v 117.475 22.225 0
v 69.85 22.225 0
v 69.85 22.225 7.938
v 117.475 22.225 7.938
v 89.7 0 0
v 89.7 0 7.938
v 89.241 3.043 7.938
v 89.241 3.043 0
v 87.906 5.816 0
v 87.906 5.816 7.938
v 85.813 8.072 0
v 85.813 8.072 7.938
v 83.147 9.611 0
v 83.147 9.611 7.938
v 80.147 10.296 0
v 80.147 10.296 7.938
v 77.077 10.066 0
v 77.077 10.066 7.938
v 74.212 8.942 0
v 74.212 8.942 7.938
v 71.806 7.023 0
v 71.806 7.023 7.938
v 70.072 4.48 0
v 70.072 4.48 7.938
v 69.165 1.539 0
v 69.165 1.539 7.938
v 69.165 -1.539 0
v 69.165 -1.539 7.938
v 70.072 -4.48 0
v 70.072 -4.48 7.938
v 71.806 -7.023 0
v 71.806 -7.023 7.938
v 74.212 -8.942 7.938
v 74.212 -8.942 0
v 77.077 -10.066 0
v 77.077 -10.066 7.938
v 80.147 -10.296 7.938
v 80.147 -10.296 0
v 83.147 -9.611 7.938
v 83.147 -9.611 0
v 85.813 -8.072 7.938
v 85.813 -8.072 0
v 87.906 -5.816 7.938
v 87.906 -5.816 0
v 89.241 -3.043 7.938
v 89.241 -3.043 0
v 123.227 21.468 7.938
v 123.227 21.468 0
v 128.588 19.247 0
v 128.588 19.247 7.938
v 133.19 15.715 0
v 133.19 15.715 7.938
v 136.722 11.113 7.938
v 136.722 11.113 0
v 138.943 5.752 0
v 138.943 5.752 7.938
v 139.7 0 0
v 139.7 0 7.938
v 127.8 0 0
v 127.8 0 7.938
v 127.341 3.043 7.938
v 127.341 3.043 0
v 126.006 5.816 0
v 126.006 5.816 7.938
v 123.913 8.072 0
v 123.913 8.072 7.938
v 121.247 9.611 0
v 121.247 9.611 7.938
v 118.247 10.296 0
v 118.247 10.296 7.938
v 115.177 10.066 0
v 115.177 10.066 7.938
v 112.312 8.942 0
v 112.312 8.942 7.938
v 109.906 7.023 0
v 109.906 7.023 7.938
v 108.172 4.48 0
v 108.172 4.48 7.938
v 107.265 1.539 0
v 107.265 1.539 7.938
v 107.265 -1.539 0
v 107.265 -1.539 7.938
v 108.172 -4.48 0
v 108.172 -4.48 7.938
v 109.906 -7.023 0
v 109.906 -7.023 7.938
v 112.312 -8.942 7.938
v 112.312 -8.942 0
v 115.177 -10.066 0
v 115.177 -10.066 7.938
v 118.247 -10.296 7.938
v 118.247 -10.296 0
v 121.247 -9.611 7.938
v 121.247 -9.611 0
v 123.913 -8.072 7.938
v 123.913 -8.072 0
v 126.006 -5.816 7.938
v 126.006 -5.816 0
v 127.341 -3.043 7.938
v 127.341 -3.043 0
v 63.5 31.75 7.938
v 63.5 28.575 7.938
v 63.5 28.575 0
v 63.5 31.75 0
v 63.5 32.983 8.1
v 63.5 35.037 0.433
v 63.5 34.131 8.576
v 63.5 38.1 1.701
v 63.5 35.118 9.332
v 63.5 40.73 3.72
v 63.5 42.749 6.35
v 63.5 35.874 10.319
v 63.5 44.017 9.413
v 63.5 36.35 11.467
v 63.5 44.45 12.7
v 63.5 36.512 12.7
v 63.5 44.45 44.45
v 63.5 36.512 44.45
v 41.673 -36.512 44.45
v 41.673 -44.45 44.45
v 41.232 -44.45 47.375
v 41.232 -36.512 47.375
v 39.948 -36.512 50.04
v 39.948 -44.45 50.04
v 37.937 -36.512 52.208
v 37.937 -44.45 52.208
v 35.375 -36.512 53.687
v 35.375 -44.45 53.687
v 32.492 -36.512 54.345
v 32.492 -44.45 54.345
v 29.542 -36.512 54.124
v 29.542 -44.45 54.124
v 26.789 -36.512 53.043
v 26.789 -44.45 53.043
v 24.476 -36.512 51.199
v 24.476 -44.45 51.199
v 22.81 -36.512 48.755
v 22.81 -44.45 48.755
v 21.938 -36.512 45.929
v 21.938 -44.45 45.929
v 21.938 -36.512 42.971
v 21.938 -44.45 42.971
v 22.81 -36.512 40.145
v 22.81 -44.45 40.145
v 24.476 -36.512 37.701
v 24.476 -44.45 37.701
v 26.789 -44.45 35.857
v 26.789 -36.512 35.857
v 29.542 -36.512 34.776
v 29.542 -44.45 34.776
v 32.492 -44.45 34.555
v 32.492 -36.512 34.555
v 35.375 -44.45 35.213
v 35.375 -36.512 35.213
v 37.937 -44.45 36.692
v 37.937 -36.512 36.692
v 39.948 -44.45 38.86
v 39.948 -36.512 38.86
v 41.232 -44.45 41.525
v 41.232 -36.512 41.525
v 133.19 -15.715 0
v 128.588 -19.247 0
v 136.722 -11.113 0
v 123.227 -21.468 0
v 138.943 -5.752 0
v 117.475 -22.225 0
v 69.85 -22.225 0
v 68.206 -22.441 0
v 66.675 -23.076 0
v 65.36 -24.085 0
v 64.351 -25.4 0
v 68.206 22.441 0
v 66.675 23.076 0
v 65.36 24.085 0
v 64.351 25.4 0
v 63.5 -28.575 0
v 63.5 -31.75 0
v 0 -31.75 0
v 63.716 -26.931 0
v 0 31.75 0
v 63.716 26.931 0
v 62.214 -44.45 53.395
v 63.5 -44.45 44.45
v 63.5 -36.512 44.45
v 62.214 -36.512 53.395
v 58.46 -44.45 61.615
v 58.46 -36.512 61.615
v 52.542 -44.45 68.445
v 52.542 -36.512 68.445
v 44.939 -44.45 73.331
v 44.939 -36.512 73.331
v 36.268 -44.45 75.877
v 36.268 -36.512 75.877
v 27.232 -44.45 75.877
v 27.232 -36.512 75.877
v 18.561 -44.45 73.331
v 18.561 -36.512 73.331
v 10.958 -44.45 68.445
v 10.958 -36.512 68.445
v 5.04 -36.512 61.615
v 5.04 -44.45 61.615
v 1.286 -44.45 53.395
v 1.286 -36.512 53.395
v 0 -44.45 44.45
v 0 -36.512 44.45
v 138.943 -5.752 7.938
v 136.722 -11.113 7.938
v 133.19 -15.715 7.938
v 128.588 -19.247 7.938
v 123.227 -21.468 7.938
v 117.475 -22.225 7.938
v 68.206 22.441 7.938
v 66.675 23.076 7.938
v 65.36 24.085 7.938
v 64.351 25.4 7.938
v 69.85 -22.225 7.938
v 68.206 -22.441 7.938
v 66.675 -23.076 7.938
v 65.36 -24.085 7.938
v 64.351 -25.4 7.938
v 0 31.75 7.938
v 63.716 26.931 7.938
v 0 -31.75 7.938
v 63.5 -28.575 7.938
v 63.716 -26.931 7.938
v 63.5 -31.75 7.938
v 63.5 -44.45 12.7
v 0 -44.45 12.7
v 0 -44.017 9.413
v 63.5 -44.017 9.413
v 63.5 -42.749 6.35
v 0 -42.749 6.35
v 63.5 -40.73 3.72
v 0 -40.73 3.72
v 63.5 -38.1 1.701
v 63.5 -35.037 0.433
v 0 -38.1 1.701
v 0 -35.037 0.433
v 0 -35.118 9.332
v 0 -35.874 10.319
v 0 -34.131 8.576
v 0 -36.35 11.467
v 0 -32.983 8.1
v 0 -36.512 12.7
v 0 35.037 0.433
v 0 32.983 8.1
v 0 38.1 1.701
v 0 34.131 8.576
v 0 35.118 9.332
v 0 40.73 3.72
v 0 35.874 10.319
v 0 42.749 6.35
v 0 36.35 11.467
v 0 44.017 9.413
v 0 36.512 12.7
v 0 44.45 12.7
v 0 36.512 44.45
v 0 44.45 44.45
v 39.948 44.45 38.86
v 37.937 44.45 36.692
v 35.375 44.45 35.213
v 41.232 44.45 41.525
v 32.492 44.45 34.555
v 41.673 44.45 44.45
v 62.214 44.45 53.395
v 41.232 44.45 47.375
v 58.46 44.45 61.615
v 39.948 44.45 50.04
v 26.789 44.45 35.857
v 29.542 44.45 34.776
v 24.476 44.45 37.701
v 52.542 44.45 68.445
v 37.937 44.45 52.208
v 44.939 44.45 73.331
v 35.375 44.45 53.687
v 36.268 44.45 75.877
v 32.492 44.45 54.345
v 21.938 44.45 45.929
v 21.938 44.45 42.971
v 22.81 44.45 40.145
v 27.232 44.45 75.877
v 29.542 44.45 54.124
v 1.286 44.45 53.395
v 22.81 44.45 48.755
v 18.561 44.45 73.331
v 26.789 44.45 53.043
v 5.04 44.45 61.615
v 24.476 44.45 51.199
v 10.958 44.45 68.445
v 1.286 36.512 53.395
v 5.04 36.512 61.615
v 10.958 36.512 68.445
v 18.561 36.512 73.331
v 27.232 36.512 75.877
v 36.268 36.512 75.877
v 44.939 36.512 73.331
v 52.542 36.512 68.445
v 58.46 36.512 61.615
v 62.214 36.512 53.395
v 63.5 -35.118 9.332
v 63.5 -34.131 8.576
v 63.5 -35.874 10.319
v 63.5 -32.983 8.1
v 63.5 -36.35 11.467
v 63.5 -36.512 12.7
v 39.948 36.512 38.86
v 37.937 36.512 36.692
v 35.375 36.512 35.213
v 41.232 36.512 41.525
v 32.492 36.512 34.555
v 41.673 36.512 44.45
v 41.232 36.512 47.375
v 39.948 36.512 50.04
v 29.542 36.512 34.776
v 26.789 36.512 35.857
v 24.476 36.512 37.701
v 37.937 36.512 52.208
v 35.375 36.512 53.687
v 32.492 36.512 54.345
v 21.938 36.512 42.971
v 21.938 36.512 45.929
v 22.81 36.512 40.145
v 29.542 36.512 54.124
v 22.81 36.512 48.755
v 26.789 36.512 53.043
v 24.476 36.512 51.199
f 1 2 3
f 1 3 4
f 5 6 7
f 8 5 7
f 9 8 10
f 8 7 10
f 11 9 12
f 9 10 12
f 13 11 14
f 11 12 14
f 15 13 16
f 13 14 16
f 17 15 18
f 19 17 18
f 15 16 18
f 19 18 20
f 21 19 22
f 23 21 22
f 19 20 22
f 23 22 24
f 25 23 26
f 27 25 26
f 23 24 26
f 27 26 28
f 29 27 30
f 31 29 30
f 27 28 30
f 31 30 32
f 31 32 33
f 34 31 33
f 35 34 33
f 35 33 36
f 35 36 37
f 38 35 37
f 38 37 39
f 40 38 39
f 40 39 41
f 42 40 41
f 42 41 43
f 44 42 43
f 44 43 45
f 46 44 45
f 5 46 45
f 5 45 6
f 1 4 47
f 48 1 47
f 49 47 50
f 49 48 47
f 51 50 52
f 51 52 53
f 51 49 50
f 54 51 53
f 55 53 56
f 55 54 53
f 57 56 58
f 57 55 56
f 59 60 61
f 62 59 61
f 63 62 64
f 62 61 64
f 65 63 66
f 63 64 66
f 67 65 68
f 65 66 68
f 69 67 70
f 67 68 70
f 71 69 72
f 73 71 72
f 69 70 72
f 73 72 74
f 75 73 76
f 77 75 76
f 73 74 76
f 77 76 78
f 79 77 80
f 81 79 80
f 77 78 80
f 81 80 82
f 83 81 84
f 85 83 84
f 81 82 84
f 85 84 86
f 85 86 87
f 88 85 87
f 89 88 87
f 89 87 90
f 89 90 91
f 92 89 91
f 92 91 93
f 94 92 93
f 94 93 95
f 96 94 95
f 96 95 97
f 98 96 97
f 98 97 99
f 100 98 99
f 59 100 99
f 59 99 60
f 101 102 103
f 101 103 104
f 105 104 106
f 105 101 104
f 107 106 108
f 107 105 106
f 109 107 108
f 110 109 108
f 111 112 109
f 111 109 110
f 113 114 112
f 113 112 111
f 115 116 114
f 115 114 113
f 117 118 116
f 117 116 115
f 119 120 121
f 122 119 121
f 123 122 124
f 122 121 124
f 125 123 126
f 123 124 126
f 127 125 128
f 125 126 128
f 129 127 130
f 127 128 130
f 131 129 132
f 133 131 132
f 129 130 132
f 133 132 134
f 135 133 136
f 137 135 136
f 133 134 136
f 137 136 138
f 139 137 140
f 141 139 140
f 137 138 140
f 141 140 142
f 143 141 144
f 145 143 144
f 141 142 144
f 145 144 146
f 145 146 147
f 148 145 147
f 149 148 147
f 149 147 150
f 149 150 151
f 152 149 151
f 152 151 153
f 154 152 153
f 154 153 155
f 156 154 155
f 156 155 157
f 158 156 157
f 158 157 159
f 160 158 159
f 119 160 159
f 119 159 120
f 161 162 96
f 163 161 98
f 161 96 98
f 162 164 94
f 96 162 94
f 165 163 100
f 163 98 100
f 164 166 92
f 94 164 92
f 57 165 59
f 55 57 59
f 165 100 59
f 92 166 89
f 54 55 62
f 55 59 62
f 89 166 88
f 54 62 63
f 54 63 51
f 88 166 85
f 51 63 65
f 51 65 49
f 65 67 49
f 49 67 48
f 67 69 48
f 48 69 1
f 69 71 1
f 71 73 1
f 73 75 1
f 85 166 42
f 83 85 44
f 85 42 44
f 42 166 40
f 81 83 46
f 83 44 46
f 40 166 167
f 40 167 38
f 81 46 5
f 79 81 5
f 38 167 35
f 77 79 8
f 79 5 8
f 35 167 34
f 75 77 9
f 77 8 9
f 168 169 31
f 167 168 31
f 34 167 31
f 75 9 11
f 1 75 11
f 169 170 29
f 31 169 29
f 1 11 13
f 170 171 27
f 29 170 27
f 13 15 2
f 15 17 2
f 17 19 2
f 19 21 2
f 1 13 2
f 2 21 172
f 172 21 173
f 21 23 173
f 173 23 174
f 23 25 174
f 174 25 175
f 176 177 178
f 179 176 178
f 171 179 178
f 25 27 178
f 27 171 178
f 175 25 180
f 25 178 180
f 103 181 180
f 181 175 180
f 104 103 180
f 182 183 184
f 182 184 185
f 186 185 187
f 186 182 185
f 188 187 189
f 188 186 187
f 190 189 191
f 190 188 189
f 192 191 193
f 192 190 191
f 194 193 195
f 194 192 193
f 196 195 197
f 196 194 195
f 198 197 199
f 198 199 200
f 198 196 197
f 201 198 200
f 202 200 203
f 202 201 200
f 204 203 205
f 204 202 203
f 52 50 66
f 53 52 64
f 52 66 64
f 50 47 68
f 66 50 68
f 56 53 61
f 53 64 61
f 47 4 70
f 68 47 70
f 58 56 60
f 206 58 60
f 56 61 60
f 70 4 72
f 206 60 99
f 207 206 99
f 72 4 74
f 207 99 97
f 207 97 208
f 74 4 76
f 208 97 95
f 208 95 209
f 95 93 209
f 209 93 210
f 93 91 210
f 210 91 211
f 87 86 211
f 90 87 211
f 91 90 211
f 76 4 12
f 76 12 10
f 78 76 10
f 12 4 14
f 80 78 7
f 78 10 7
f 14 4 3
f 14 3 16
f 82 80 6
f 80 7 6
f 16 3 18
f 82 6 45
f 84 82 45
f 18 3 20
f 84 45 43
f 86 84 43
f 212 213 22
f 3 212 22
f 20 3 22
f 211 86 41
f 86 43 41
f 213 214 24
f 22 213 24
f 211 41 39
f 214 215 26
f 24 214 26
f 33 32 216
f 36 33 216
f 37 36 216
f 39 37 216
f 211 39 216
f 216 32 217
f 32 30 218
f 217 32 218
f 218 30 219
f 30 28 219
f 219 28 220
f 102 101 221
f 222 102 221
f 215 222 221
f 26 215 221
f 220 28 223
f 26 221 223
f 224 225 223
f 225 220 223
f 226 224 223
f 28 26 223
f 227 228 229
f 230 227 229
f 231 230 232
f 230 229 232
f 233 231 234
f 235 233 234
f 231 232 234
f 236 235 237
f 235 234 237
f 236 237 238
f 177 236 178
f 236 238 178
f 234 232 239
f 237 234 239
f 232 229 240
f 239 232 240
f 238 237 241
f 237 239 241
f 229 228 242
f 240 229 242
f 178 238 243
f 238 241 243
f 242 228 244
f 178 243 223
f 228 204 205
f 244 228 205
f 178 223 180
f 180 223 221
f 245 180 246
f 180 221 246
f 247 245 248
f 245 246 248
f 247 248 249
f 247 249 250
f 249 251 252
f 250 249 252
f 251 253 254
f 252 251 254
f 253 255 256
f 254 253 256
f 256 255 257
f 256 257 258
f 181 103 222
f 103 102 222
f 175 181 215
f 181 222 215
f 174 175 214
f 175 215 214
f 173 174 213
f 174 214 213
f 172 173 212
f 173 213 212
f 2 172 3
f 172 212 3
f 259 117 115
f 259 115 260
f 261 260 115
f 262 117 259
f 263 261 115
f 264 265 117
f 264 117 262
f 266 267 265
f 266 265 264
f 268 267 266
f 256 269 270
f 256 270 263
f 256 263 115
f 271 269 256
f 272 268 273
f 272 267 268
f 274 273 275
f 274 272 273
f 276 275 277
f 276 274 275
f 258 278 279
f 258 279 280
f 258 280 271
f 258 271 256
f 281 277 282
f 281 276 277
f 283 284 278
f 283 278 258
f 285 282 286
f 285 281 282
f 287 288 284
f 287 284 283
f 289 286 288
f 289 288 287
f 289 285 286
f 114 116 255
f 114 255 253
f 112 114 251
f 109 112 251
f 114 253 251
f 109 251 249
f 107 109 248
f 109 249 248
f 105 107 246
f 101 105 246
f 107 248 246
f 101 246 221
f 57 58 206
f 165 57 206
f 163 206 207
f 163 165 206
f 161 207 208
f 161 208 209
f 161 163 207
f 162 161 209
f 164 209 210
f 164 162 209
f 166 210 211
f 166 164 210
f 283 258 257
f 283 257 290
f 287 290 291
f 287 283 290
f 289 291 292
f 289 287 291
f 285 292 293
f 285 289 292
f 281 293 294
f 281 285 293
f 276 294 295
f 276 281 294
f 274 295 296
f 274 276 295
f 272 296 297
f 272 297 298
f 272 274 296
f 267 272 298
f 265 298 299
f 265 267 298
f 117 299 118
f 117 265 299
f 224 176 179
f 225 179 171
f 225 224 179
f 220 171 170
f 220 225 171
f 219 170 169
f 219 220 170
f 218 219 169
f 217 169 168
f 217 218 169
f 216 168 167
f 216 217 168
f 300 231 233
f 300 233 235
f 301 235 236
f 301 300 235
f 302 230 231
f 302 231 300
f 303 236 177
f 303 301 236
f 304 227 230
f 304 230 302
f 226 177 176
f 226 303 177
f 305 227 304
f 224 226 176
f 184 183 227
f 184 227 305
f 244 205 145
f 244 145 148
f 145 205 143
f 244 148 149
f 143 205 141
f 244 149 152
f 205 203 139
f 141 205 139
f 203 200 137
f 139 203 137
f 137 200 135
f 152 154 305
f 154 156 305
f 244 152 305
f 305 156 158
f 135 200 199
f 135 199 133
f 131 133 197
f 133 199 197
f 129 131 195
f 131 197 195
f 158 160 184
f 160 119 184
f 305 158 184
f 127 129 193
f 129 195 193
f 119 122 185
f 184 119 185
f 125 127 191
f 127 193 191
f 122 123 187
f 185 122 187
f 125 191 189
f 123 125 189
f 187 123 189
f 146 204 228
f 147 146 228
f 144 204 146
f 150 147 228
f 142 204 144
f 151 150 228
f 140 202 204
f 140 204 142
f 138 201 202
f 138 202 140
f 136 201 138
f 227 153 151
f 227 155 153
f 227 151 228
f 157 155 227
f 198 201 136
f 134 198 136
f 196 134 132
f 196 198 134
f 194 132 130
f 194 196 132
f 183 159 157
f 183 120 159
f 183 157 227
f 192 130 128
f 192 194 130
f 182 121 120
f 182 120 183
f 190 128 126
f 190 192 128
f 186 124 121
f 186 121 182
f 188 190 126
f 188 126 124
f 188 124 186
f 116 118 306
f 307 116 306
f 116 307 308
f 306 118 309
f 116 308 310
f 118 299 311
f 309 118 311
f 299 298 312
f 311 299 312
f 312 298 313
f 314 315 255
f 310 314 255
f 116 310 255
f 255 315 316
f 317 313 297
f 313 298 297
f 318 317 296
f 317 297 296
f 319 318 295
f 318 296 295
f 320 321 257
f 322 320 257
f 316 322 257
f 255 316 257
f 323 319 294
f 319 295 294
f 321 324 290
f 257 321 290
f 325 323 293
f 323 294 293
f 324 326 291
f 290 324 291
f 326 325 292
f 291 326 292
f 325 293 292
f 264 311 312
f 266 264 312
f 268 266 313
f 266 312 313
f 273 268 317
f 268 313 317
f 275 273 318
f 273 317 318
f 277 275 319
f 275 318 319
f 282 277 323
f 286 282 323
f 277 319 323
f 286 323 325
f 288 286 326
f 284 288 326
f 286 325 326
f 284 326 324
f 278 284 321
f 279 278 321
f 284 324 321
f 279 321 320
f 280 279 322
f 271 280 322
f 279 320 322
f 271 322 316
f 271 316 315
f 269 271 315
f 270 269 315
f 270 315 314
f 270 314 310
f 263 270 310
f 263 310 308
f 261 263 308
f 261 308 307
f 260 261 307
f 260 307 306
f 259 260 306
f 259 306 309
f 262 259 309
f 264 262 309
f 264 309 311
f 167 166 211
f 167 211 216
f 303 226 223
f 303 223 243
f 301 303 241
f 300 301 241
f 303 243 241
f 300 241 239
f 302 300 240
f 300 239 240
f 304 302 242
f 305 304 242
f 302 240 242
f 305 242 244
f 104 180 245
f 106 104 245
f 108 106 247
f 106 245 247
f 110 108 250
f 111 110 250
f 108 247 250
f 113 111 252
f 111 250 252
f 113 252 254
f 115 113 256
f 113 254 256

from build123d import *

# Parameters (mm, degrees)
F1_DEPTH  = 63.5
F3_DEPTH  = 7.9375
F5_DEPTH  = 7.9375
F7_DEPTH  = 7.9375
F8_R      = 6.35
F9_R      = 9.92251
F10_DEPTH = 88.901
F11_R     = 10.3251
F12_DEPTH = 7.9385


with BuildPart() as f1:
    # F0 (on Right) → F1 (new body)
    with BuildSketch(Plane.YZ):
        with BuildLine():
            Line((-36.5125, 44.45), (-44.45, 44.45))
            Line((-44.45, 44.45), (-44.45, 12.7))
            ThreePointArc((-44.45, 12.7), (-40.7302561211, 3.7197438789), (-31.75, 0))
            Line((-31.75, 0), (0, 0))
            Line((0, 0), (0, 7.9375))
            Line((0, 7.9375), (-31.75, 7.9375))
            ThreePointArc((-31.75, 7.9375), (-35.1175960454, 9.3324039546), (-36.5125, 12.7))
            Line((-36.5125, 12.7), (-36.5125, 44.45))
        make_face()
        with BuildLine():
            Line((0, 7.9375), (0, 0))
            Line((0, 0), (31.75, 0))
            ThreePointArc((31.75, 0), (40.7302561211, 3.7197438789), (44.45, 12.7))
            Line((44.45, 12.7), (44.45, 44.45))
            Line((44.45, 44.45), (36.5125, 44.45))
            Line((36.5125, 44.45), (36.5125, 12.7))
            ThreePointArc((36.5125, 12.7), (35.1175960454, 9.3324039546), (31.75, 7.9375))
            Line((31.75, 7.9375), (0, 7.9375))
        make_face()
    extrude(amount=F1_DEPTH)

    # F2 (on face) → F3 (join, through all)
    with BuildSketch(Plane.XZ.offset(44.45)):
        with BuildLine():
            Line((0, 44.45), (63.5, 44.45))
            ThreePointArc((63.5, 44.45), (31.75, 76.2), (0, 44.45))
        make_face()
    extrude(amount=-F3_DEPTH)

    # F4 (on face) → F5 (join, through all)
    with BuildSketch(Plane(origin=(0, 44.45, 0), x_dir=(-1, 0, 0), z_dir=(0, 1, 0))):
        with BuildLine():
            ThreePointArc((0, 44.45), (-31.75, 76.2), (-63.5, 44.45))
            Line((-63.5, 44.45), (0, 44.45))
        make_face()
    extrude(amount=-F5_DEPTH)

    # F6 (on face) → F7 (join, through all)
    with BuildSketch(Plane(origin=(0, 0, 0), x_dir=(1, 0, 0), z_dir=(0, 0, -1))):
        with BuildLine():
            Line((63.5, 22.225), (63.5, -22.225))
            Line((63.5, -22.225), (117.475, -22.225))
            ThreePointArc((117.475, -22.225), (133.1904482119, -15.7154482119), (139.7, 0))
            ThreePointArc((139.7, 0), (133.1904482119, 15.7154482119), (117.475, 22.225))
            Line((117.475, 22.225), (63.5, 22.225))
        make_face()
    extrude(amount=-F7_DEPTH)

    # F8
    f8_edges = [f1.edges().sort_by_distance(p)[0] for p in [
        (63.5, -22.225, 3.96875),
        (63.5, 22.225, 3.96875),
    ]]
    fillet(f8_edges, radius=F8_R)

    # F9 (on face) → F10 (cut, through all)
    with BuildSketch(Plane.XZ.offset(44.45)):
        with Locations((31.75, 44.45)):
            Circle(F9_R)
    extrude(amount=-F10_DEPTH, mode=Mode.SUBTRACT)

    # F11 (on face) → F12 (cut, through all)
    with BuildSketch(Plane.XY.offset(7.9375)):
        with Locations((117.475, 0)):
            Circle(F11_R)
        with Locations((79.375, 0)):
            Circle(F11_R)
    extrude(amount=-F12_DEPTH, mode=Mode.SUBTRACT)


solid = f1.part
